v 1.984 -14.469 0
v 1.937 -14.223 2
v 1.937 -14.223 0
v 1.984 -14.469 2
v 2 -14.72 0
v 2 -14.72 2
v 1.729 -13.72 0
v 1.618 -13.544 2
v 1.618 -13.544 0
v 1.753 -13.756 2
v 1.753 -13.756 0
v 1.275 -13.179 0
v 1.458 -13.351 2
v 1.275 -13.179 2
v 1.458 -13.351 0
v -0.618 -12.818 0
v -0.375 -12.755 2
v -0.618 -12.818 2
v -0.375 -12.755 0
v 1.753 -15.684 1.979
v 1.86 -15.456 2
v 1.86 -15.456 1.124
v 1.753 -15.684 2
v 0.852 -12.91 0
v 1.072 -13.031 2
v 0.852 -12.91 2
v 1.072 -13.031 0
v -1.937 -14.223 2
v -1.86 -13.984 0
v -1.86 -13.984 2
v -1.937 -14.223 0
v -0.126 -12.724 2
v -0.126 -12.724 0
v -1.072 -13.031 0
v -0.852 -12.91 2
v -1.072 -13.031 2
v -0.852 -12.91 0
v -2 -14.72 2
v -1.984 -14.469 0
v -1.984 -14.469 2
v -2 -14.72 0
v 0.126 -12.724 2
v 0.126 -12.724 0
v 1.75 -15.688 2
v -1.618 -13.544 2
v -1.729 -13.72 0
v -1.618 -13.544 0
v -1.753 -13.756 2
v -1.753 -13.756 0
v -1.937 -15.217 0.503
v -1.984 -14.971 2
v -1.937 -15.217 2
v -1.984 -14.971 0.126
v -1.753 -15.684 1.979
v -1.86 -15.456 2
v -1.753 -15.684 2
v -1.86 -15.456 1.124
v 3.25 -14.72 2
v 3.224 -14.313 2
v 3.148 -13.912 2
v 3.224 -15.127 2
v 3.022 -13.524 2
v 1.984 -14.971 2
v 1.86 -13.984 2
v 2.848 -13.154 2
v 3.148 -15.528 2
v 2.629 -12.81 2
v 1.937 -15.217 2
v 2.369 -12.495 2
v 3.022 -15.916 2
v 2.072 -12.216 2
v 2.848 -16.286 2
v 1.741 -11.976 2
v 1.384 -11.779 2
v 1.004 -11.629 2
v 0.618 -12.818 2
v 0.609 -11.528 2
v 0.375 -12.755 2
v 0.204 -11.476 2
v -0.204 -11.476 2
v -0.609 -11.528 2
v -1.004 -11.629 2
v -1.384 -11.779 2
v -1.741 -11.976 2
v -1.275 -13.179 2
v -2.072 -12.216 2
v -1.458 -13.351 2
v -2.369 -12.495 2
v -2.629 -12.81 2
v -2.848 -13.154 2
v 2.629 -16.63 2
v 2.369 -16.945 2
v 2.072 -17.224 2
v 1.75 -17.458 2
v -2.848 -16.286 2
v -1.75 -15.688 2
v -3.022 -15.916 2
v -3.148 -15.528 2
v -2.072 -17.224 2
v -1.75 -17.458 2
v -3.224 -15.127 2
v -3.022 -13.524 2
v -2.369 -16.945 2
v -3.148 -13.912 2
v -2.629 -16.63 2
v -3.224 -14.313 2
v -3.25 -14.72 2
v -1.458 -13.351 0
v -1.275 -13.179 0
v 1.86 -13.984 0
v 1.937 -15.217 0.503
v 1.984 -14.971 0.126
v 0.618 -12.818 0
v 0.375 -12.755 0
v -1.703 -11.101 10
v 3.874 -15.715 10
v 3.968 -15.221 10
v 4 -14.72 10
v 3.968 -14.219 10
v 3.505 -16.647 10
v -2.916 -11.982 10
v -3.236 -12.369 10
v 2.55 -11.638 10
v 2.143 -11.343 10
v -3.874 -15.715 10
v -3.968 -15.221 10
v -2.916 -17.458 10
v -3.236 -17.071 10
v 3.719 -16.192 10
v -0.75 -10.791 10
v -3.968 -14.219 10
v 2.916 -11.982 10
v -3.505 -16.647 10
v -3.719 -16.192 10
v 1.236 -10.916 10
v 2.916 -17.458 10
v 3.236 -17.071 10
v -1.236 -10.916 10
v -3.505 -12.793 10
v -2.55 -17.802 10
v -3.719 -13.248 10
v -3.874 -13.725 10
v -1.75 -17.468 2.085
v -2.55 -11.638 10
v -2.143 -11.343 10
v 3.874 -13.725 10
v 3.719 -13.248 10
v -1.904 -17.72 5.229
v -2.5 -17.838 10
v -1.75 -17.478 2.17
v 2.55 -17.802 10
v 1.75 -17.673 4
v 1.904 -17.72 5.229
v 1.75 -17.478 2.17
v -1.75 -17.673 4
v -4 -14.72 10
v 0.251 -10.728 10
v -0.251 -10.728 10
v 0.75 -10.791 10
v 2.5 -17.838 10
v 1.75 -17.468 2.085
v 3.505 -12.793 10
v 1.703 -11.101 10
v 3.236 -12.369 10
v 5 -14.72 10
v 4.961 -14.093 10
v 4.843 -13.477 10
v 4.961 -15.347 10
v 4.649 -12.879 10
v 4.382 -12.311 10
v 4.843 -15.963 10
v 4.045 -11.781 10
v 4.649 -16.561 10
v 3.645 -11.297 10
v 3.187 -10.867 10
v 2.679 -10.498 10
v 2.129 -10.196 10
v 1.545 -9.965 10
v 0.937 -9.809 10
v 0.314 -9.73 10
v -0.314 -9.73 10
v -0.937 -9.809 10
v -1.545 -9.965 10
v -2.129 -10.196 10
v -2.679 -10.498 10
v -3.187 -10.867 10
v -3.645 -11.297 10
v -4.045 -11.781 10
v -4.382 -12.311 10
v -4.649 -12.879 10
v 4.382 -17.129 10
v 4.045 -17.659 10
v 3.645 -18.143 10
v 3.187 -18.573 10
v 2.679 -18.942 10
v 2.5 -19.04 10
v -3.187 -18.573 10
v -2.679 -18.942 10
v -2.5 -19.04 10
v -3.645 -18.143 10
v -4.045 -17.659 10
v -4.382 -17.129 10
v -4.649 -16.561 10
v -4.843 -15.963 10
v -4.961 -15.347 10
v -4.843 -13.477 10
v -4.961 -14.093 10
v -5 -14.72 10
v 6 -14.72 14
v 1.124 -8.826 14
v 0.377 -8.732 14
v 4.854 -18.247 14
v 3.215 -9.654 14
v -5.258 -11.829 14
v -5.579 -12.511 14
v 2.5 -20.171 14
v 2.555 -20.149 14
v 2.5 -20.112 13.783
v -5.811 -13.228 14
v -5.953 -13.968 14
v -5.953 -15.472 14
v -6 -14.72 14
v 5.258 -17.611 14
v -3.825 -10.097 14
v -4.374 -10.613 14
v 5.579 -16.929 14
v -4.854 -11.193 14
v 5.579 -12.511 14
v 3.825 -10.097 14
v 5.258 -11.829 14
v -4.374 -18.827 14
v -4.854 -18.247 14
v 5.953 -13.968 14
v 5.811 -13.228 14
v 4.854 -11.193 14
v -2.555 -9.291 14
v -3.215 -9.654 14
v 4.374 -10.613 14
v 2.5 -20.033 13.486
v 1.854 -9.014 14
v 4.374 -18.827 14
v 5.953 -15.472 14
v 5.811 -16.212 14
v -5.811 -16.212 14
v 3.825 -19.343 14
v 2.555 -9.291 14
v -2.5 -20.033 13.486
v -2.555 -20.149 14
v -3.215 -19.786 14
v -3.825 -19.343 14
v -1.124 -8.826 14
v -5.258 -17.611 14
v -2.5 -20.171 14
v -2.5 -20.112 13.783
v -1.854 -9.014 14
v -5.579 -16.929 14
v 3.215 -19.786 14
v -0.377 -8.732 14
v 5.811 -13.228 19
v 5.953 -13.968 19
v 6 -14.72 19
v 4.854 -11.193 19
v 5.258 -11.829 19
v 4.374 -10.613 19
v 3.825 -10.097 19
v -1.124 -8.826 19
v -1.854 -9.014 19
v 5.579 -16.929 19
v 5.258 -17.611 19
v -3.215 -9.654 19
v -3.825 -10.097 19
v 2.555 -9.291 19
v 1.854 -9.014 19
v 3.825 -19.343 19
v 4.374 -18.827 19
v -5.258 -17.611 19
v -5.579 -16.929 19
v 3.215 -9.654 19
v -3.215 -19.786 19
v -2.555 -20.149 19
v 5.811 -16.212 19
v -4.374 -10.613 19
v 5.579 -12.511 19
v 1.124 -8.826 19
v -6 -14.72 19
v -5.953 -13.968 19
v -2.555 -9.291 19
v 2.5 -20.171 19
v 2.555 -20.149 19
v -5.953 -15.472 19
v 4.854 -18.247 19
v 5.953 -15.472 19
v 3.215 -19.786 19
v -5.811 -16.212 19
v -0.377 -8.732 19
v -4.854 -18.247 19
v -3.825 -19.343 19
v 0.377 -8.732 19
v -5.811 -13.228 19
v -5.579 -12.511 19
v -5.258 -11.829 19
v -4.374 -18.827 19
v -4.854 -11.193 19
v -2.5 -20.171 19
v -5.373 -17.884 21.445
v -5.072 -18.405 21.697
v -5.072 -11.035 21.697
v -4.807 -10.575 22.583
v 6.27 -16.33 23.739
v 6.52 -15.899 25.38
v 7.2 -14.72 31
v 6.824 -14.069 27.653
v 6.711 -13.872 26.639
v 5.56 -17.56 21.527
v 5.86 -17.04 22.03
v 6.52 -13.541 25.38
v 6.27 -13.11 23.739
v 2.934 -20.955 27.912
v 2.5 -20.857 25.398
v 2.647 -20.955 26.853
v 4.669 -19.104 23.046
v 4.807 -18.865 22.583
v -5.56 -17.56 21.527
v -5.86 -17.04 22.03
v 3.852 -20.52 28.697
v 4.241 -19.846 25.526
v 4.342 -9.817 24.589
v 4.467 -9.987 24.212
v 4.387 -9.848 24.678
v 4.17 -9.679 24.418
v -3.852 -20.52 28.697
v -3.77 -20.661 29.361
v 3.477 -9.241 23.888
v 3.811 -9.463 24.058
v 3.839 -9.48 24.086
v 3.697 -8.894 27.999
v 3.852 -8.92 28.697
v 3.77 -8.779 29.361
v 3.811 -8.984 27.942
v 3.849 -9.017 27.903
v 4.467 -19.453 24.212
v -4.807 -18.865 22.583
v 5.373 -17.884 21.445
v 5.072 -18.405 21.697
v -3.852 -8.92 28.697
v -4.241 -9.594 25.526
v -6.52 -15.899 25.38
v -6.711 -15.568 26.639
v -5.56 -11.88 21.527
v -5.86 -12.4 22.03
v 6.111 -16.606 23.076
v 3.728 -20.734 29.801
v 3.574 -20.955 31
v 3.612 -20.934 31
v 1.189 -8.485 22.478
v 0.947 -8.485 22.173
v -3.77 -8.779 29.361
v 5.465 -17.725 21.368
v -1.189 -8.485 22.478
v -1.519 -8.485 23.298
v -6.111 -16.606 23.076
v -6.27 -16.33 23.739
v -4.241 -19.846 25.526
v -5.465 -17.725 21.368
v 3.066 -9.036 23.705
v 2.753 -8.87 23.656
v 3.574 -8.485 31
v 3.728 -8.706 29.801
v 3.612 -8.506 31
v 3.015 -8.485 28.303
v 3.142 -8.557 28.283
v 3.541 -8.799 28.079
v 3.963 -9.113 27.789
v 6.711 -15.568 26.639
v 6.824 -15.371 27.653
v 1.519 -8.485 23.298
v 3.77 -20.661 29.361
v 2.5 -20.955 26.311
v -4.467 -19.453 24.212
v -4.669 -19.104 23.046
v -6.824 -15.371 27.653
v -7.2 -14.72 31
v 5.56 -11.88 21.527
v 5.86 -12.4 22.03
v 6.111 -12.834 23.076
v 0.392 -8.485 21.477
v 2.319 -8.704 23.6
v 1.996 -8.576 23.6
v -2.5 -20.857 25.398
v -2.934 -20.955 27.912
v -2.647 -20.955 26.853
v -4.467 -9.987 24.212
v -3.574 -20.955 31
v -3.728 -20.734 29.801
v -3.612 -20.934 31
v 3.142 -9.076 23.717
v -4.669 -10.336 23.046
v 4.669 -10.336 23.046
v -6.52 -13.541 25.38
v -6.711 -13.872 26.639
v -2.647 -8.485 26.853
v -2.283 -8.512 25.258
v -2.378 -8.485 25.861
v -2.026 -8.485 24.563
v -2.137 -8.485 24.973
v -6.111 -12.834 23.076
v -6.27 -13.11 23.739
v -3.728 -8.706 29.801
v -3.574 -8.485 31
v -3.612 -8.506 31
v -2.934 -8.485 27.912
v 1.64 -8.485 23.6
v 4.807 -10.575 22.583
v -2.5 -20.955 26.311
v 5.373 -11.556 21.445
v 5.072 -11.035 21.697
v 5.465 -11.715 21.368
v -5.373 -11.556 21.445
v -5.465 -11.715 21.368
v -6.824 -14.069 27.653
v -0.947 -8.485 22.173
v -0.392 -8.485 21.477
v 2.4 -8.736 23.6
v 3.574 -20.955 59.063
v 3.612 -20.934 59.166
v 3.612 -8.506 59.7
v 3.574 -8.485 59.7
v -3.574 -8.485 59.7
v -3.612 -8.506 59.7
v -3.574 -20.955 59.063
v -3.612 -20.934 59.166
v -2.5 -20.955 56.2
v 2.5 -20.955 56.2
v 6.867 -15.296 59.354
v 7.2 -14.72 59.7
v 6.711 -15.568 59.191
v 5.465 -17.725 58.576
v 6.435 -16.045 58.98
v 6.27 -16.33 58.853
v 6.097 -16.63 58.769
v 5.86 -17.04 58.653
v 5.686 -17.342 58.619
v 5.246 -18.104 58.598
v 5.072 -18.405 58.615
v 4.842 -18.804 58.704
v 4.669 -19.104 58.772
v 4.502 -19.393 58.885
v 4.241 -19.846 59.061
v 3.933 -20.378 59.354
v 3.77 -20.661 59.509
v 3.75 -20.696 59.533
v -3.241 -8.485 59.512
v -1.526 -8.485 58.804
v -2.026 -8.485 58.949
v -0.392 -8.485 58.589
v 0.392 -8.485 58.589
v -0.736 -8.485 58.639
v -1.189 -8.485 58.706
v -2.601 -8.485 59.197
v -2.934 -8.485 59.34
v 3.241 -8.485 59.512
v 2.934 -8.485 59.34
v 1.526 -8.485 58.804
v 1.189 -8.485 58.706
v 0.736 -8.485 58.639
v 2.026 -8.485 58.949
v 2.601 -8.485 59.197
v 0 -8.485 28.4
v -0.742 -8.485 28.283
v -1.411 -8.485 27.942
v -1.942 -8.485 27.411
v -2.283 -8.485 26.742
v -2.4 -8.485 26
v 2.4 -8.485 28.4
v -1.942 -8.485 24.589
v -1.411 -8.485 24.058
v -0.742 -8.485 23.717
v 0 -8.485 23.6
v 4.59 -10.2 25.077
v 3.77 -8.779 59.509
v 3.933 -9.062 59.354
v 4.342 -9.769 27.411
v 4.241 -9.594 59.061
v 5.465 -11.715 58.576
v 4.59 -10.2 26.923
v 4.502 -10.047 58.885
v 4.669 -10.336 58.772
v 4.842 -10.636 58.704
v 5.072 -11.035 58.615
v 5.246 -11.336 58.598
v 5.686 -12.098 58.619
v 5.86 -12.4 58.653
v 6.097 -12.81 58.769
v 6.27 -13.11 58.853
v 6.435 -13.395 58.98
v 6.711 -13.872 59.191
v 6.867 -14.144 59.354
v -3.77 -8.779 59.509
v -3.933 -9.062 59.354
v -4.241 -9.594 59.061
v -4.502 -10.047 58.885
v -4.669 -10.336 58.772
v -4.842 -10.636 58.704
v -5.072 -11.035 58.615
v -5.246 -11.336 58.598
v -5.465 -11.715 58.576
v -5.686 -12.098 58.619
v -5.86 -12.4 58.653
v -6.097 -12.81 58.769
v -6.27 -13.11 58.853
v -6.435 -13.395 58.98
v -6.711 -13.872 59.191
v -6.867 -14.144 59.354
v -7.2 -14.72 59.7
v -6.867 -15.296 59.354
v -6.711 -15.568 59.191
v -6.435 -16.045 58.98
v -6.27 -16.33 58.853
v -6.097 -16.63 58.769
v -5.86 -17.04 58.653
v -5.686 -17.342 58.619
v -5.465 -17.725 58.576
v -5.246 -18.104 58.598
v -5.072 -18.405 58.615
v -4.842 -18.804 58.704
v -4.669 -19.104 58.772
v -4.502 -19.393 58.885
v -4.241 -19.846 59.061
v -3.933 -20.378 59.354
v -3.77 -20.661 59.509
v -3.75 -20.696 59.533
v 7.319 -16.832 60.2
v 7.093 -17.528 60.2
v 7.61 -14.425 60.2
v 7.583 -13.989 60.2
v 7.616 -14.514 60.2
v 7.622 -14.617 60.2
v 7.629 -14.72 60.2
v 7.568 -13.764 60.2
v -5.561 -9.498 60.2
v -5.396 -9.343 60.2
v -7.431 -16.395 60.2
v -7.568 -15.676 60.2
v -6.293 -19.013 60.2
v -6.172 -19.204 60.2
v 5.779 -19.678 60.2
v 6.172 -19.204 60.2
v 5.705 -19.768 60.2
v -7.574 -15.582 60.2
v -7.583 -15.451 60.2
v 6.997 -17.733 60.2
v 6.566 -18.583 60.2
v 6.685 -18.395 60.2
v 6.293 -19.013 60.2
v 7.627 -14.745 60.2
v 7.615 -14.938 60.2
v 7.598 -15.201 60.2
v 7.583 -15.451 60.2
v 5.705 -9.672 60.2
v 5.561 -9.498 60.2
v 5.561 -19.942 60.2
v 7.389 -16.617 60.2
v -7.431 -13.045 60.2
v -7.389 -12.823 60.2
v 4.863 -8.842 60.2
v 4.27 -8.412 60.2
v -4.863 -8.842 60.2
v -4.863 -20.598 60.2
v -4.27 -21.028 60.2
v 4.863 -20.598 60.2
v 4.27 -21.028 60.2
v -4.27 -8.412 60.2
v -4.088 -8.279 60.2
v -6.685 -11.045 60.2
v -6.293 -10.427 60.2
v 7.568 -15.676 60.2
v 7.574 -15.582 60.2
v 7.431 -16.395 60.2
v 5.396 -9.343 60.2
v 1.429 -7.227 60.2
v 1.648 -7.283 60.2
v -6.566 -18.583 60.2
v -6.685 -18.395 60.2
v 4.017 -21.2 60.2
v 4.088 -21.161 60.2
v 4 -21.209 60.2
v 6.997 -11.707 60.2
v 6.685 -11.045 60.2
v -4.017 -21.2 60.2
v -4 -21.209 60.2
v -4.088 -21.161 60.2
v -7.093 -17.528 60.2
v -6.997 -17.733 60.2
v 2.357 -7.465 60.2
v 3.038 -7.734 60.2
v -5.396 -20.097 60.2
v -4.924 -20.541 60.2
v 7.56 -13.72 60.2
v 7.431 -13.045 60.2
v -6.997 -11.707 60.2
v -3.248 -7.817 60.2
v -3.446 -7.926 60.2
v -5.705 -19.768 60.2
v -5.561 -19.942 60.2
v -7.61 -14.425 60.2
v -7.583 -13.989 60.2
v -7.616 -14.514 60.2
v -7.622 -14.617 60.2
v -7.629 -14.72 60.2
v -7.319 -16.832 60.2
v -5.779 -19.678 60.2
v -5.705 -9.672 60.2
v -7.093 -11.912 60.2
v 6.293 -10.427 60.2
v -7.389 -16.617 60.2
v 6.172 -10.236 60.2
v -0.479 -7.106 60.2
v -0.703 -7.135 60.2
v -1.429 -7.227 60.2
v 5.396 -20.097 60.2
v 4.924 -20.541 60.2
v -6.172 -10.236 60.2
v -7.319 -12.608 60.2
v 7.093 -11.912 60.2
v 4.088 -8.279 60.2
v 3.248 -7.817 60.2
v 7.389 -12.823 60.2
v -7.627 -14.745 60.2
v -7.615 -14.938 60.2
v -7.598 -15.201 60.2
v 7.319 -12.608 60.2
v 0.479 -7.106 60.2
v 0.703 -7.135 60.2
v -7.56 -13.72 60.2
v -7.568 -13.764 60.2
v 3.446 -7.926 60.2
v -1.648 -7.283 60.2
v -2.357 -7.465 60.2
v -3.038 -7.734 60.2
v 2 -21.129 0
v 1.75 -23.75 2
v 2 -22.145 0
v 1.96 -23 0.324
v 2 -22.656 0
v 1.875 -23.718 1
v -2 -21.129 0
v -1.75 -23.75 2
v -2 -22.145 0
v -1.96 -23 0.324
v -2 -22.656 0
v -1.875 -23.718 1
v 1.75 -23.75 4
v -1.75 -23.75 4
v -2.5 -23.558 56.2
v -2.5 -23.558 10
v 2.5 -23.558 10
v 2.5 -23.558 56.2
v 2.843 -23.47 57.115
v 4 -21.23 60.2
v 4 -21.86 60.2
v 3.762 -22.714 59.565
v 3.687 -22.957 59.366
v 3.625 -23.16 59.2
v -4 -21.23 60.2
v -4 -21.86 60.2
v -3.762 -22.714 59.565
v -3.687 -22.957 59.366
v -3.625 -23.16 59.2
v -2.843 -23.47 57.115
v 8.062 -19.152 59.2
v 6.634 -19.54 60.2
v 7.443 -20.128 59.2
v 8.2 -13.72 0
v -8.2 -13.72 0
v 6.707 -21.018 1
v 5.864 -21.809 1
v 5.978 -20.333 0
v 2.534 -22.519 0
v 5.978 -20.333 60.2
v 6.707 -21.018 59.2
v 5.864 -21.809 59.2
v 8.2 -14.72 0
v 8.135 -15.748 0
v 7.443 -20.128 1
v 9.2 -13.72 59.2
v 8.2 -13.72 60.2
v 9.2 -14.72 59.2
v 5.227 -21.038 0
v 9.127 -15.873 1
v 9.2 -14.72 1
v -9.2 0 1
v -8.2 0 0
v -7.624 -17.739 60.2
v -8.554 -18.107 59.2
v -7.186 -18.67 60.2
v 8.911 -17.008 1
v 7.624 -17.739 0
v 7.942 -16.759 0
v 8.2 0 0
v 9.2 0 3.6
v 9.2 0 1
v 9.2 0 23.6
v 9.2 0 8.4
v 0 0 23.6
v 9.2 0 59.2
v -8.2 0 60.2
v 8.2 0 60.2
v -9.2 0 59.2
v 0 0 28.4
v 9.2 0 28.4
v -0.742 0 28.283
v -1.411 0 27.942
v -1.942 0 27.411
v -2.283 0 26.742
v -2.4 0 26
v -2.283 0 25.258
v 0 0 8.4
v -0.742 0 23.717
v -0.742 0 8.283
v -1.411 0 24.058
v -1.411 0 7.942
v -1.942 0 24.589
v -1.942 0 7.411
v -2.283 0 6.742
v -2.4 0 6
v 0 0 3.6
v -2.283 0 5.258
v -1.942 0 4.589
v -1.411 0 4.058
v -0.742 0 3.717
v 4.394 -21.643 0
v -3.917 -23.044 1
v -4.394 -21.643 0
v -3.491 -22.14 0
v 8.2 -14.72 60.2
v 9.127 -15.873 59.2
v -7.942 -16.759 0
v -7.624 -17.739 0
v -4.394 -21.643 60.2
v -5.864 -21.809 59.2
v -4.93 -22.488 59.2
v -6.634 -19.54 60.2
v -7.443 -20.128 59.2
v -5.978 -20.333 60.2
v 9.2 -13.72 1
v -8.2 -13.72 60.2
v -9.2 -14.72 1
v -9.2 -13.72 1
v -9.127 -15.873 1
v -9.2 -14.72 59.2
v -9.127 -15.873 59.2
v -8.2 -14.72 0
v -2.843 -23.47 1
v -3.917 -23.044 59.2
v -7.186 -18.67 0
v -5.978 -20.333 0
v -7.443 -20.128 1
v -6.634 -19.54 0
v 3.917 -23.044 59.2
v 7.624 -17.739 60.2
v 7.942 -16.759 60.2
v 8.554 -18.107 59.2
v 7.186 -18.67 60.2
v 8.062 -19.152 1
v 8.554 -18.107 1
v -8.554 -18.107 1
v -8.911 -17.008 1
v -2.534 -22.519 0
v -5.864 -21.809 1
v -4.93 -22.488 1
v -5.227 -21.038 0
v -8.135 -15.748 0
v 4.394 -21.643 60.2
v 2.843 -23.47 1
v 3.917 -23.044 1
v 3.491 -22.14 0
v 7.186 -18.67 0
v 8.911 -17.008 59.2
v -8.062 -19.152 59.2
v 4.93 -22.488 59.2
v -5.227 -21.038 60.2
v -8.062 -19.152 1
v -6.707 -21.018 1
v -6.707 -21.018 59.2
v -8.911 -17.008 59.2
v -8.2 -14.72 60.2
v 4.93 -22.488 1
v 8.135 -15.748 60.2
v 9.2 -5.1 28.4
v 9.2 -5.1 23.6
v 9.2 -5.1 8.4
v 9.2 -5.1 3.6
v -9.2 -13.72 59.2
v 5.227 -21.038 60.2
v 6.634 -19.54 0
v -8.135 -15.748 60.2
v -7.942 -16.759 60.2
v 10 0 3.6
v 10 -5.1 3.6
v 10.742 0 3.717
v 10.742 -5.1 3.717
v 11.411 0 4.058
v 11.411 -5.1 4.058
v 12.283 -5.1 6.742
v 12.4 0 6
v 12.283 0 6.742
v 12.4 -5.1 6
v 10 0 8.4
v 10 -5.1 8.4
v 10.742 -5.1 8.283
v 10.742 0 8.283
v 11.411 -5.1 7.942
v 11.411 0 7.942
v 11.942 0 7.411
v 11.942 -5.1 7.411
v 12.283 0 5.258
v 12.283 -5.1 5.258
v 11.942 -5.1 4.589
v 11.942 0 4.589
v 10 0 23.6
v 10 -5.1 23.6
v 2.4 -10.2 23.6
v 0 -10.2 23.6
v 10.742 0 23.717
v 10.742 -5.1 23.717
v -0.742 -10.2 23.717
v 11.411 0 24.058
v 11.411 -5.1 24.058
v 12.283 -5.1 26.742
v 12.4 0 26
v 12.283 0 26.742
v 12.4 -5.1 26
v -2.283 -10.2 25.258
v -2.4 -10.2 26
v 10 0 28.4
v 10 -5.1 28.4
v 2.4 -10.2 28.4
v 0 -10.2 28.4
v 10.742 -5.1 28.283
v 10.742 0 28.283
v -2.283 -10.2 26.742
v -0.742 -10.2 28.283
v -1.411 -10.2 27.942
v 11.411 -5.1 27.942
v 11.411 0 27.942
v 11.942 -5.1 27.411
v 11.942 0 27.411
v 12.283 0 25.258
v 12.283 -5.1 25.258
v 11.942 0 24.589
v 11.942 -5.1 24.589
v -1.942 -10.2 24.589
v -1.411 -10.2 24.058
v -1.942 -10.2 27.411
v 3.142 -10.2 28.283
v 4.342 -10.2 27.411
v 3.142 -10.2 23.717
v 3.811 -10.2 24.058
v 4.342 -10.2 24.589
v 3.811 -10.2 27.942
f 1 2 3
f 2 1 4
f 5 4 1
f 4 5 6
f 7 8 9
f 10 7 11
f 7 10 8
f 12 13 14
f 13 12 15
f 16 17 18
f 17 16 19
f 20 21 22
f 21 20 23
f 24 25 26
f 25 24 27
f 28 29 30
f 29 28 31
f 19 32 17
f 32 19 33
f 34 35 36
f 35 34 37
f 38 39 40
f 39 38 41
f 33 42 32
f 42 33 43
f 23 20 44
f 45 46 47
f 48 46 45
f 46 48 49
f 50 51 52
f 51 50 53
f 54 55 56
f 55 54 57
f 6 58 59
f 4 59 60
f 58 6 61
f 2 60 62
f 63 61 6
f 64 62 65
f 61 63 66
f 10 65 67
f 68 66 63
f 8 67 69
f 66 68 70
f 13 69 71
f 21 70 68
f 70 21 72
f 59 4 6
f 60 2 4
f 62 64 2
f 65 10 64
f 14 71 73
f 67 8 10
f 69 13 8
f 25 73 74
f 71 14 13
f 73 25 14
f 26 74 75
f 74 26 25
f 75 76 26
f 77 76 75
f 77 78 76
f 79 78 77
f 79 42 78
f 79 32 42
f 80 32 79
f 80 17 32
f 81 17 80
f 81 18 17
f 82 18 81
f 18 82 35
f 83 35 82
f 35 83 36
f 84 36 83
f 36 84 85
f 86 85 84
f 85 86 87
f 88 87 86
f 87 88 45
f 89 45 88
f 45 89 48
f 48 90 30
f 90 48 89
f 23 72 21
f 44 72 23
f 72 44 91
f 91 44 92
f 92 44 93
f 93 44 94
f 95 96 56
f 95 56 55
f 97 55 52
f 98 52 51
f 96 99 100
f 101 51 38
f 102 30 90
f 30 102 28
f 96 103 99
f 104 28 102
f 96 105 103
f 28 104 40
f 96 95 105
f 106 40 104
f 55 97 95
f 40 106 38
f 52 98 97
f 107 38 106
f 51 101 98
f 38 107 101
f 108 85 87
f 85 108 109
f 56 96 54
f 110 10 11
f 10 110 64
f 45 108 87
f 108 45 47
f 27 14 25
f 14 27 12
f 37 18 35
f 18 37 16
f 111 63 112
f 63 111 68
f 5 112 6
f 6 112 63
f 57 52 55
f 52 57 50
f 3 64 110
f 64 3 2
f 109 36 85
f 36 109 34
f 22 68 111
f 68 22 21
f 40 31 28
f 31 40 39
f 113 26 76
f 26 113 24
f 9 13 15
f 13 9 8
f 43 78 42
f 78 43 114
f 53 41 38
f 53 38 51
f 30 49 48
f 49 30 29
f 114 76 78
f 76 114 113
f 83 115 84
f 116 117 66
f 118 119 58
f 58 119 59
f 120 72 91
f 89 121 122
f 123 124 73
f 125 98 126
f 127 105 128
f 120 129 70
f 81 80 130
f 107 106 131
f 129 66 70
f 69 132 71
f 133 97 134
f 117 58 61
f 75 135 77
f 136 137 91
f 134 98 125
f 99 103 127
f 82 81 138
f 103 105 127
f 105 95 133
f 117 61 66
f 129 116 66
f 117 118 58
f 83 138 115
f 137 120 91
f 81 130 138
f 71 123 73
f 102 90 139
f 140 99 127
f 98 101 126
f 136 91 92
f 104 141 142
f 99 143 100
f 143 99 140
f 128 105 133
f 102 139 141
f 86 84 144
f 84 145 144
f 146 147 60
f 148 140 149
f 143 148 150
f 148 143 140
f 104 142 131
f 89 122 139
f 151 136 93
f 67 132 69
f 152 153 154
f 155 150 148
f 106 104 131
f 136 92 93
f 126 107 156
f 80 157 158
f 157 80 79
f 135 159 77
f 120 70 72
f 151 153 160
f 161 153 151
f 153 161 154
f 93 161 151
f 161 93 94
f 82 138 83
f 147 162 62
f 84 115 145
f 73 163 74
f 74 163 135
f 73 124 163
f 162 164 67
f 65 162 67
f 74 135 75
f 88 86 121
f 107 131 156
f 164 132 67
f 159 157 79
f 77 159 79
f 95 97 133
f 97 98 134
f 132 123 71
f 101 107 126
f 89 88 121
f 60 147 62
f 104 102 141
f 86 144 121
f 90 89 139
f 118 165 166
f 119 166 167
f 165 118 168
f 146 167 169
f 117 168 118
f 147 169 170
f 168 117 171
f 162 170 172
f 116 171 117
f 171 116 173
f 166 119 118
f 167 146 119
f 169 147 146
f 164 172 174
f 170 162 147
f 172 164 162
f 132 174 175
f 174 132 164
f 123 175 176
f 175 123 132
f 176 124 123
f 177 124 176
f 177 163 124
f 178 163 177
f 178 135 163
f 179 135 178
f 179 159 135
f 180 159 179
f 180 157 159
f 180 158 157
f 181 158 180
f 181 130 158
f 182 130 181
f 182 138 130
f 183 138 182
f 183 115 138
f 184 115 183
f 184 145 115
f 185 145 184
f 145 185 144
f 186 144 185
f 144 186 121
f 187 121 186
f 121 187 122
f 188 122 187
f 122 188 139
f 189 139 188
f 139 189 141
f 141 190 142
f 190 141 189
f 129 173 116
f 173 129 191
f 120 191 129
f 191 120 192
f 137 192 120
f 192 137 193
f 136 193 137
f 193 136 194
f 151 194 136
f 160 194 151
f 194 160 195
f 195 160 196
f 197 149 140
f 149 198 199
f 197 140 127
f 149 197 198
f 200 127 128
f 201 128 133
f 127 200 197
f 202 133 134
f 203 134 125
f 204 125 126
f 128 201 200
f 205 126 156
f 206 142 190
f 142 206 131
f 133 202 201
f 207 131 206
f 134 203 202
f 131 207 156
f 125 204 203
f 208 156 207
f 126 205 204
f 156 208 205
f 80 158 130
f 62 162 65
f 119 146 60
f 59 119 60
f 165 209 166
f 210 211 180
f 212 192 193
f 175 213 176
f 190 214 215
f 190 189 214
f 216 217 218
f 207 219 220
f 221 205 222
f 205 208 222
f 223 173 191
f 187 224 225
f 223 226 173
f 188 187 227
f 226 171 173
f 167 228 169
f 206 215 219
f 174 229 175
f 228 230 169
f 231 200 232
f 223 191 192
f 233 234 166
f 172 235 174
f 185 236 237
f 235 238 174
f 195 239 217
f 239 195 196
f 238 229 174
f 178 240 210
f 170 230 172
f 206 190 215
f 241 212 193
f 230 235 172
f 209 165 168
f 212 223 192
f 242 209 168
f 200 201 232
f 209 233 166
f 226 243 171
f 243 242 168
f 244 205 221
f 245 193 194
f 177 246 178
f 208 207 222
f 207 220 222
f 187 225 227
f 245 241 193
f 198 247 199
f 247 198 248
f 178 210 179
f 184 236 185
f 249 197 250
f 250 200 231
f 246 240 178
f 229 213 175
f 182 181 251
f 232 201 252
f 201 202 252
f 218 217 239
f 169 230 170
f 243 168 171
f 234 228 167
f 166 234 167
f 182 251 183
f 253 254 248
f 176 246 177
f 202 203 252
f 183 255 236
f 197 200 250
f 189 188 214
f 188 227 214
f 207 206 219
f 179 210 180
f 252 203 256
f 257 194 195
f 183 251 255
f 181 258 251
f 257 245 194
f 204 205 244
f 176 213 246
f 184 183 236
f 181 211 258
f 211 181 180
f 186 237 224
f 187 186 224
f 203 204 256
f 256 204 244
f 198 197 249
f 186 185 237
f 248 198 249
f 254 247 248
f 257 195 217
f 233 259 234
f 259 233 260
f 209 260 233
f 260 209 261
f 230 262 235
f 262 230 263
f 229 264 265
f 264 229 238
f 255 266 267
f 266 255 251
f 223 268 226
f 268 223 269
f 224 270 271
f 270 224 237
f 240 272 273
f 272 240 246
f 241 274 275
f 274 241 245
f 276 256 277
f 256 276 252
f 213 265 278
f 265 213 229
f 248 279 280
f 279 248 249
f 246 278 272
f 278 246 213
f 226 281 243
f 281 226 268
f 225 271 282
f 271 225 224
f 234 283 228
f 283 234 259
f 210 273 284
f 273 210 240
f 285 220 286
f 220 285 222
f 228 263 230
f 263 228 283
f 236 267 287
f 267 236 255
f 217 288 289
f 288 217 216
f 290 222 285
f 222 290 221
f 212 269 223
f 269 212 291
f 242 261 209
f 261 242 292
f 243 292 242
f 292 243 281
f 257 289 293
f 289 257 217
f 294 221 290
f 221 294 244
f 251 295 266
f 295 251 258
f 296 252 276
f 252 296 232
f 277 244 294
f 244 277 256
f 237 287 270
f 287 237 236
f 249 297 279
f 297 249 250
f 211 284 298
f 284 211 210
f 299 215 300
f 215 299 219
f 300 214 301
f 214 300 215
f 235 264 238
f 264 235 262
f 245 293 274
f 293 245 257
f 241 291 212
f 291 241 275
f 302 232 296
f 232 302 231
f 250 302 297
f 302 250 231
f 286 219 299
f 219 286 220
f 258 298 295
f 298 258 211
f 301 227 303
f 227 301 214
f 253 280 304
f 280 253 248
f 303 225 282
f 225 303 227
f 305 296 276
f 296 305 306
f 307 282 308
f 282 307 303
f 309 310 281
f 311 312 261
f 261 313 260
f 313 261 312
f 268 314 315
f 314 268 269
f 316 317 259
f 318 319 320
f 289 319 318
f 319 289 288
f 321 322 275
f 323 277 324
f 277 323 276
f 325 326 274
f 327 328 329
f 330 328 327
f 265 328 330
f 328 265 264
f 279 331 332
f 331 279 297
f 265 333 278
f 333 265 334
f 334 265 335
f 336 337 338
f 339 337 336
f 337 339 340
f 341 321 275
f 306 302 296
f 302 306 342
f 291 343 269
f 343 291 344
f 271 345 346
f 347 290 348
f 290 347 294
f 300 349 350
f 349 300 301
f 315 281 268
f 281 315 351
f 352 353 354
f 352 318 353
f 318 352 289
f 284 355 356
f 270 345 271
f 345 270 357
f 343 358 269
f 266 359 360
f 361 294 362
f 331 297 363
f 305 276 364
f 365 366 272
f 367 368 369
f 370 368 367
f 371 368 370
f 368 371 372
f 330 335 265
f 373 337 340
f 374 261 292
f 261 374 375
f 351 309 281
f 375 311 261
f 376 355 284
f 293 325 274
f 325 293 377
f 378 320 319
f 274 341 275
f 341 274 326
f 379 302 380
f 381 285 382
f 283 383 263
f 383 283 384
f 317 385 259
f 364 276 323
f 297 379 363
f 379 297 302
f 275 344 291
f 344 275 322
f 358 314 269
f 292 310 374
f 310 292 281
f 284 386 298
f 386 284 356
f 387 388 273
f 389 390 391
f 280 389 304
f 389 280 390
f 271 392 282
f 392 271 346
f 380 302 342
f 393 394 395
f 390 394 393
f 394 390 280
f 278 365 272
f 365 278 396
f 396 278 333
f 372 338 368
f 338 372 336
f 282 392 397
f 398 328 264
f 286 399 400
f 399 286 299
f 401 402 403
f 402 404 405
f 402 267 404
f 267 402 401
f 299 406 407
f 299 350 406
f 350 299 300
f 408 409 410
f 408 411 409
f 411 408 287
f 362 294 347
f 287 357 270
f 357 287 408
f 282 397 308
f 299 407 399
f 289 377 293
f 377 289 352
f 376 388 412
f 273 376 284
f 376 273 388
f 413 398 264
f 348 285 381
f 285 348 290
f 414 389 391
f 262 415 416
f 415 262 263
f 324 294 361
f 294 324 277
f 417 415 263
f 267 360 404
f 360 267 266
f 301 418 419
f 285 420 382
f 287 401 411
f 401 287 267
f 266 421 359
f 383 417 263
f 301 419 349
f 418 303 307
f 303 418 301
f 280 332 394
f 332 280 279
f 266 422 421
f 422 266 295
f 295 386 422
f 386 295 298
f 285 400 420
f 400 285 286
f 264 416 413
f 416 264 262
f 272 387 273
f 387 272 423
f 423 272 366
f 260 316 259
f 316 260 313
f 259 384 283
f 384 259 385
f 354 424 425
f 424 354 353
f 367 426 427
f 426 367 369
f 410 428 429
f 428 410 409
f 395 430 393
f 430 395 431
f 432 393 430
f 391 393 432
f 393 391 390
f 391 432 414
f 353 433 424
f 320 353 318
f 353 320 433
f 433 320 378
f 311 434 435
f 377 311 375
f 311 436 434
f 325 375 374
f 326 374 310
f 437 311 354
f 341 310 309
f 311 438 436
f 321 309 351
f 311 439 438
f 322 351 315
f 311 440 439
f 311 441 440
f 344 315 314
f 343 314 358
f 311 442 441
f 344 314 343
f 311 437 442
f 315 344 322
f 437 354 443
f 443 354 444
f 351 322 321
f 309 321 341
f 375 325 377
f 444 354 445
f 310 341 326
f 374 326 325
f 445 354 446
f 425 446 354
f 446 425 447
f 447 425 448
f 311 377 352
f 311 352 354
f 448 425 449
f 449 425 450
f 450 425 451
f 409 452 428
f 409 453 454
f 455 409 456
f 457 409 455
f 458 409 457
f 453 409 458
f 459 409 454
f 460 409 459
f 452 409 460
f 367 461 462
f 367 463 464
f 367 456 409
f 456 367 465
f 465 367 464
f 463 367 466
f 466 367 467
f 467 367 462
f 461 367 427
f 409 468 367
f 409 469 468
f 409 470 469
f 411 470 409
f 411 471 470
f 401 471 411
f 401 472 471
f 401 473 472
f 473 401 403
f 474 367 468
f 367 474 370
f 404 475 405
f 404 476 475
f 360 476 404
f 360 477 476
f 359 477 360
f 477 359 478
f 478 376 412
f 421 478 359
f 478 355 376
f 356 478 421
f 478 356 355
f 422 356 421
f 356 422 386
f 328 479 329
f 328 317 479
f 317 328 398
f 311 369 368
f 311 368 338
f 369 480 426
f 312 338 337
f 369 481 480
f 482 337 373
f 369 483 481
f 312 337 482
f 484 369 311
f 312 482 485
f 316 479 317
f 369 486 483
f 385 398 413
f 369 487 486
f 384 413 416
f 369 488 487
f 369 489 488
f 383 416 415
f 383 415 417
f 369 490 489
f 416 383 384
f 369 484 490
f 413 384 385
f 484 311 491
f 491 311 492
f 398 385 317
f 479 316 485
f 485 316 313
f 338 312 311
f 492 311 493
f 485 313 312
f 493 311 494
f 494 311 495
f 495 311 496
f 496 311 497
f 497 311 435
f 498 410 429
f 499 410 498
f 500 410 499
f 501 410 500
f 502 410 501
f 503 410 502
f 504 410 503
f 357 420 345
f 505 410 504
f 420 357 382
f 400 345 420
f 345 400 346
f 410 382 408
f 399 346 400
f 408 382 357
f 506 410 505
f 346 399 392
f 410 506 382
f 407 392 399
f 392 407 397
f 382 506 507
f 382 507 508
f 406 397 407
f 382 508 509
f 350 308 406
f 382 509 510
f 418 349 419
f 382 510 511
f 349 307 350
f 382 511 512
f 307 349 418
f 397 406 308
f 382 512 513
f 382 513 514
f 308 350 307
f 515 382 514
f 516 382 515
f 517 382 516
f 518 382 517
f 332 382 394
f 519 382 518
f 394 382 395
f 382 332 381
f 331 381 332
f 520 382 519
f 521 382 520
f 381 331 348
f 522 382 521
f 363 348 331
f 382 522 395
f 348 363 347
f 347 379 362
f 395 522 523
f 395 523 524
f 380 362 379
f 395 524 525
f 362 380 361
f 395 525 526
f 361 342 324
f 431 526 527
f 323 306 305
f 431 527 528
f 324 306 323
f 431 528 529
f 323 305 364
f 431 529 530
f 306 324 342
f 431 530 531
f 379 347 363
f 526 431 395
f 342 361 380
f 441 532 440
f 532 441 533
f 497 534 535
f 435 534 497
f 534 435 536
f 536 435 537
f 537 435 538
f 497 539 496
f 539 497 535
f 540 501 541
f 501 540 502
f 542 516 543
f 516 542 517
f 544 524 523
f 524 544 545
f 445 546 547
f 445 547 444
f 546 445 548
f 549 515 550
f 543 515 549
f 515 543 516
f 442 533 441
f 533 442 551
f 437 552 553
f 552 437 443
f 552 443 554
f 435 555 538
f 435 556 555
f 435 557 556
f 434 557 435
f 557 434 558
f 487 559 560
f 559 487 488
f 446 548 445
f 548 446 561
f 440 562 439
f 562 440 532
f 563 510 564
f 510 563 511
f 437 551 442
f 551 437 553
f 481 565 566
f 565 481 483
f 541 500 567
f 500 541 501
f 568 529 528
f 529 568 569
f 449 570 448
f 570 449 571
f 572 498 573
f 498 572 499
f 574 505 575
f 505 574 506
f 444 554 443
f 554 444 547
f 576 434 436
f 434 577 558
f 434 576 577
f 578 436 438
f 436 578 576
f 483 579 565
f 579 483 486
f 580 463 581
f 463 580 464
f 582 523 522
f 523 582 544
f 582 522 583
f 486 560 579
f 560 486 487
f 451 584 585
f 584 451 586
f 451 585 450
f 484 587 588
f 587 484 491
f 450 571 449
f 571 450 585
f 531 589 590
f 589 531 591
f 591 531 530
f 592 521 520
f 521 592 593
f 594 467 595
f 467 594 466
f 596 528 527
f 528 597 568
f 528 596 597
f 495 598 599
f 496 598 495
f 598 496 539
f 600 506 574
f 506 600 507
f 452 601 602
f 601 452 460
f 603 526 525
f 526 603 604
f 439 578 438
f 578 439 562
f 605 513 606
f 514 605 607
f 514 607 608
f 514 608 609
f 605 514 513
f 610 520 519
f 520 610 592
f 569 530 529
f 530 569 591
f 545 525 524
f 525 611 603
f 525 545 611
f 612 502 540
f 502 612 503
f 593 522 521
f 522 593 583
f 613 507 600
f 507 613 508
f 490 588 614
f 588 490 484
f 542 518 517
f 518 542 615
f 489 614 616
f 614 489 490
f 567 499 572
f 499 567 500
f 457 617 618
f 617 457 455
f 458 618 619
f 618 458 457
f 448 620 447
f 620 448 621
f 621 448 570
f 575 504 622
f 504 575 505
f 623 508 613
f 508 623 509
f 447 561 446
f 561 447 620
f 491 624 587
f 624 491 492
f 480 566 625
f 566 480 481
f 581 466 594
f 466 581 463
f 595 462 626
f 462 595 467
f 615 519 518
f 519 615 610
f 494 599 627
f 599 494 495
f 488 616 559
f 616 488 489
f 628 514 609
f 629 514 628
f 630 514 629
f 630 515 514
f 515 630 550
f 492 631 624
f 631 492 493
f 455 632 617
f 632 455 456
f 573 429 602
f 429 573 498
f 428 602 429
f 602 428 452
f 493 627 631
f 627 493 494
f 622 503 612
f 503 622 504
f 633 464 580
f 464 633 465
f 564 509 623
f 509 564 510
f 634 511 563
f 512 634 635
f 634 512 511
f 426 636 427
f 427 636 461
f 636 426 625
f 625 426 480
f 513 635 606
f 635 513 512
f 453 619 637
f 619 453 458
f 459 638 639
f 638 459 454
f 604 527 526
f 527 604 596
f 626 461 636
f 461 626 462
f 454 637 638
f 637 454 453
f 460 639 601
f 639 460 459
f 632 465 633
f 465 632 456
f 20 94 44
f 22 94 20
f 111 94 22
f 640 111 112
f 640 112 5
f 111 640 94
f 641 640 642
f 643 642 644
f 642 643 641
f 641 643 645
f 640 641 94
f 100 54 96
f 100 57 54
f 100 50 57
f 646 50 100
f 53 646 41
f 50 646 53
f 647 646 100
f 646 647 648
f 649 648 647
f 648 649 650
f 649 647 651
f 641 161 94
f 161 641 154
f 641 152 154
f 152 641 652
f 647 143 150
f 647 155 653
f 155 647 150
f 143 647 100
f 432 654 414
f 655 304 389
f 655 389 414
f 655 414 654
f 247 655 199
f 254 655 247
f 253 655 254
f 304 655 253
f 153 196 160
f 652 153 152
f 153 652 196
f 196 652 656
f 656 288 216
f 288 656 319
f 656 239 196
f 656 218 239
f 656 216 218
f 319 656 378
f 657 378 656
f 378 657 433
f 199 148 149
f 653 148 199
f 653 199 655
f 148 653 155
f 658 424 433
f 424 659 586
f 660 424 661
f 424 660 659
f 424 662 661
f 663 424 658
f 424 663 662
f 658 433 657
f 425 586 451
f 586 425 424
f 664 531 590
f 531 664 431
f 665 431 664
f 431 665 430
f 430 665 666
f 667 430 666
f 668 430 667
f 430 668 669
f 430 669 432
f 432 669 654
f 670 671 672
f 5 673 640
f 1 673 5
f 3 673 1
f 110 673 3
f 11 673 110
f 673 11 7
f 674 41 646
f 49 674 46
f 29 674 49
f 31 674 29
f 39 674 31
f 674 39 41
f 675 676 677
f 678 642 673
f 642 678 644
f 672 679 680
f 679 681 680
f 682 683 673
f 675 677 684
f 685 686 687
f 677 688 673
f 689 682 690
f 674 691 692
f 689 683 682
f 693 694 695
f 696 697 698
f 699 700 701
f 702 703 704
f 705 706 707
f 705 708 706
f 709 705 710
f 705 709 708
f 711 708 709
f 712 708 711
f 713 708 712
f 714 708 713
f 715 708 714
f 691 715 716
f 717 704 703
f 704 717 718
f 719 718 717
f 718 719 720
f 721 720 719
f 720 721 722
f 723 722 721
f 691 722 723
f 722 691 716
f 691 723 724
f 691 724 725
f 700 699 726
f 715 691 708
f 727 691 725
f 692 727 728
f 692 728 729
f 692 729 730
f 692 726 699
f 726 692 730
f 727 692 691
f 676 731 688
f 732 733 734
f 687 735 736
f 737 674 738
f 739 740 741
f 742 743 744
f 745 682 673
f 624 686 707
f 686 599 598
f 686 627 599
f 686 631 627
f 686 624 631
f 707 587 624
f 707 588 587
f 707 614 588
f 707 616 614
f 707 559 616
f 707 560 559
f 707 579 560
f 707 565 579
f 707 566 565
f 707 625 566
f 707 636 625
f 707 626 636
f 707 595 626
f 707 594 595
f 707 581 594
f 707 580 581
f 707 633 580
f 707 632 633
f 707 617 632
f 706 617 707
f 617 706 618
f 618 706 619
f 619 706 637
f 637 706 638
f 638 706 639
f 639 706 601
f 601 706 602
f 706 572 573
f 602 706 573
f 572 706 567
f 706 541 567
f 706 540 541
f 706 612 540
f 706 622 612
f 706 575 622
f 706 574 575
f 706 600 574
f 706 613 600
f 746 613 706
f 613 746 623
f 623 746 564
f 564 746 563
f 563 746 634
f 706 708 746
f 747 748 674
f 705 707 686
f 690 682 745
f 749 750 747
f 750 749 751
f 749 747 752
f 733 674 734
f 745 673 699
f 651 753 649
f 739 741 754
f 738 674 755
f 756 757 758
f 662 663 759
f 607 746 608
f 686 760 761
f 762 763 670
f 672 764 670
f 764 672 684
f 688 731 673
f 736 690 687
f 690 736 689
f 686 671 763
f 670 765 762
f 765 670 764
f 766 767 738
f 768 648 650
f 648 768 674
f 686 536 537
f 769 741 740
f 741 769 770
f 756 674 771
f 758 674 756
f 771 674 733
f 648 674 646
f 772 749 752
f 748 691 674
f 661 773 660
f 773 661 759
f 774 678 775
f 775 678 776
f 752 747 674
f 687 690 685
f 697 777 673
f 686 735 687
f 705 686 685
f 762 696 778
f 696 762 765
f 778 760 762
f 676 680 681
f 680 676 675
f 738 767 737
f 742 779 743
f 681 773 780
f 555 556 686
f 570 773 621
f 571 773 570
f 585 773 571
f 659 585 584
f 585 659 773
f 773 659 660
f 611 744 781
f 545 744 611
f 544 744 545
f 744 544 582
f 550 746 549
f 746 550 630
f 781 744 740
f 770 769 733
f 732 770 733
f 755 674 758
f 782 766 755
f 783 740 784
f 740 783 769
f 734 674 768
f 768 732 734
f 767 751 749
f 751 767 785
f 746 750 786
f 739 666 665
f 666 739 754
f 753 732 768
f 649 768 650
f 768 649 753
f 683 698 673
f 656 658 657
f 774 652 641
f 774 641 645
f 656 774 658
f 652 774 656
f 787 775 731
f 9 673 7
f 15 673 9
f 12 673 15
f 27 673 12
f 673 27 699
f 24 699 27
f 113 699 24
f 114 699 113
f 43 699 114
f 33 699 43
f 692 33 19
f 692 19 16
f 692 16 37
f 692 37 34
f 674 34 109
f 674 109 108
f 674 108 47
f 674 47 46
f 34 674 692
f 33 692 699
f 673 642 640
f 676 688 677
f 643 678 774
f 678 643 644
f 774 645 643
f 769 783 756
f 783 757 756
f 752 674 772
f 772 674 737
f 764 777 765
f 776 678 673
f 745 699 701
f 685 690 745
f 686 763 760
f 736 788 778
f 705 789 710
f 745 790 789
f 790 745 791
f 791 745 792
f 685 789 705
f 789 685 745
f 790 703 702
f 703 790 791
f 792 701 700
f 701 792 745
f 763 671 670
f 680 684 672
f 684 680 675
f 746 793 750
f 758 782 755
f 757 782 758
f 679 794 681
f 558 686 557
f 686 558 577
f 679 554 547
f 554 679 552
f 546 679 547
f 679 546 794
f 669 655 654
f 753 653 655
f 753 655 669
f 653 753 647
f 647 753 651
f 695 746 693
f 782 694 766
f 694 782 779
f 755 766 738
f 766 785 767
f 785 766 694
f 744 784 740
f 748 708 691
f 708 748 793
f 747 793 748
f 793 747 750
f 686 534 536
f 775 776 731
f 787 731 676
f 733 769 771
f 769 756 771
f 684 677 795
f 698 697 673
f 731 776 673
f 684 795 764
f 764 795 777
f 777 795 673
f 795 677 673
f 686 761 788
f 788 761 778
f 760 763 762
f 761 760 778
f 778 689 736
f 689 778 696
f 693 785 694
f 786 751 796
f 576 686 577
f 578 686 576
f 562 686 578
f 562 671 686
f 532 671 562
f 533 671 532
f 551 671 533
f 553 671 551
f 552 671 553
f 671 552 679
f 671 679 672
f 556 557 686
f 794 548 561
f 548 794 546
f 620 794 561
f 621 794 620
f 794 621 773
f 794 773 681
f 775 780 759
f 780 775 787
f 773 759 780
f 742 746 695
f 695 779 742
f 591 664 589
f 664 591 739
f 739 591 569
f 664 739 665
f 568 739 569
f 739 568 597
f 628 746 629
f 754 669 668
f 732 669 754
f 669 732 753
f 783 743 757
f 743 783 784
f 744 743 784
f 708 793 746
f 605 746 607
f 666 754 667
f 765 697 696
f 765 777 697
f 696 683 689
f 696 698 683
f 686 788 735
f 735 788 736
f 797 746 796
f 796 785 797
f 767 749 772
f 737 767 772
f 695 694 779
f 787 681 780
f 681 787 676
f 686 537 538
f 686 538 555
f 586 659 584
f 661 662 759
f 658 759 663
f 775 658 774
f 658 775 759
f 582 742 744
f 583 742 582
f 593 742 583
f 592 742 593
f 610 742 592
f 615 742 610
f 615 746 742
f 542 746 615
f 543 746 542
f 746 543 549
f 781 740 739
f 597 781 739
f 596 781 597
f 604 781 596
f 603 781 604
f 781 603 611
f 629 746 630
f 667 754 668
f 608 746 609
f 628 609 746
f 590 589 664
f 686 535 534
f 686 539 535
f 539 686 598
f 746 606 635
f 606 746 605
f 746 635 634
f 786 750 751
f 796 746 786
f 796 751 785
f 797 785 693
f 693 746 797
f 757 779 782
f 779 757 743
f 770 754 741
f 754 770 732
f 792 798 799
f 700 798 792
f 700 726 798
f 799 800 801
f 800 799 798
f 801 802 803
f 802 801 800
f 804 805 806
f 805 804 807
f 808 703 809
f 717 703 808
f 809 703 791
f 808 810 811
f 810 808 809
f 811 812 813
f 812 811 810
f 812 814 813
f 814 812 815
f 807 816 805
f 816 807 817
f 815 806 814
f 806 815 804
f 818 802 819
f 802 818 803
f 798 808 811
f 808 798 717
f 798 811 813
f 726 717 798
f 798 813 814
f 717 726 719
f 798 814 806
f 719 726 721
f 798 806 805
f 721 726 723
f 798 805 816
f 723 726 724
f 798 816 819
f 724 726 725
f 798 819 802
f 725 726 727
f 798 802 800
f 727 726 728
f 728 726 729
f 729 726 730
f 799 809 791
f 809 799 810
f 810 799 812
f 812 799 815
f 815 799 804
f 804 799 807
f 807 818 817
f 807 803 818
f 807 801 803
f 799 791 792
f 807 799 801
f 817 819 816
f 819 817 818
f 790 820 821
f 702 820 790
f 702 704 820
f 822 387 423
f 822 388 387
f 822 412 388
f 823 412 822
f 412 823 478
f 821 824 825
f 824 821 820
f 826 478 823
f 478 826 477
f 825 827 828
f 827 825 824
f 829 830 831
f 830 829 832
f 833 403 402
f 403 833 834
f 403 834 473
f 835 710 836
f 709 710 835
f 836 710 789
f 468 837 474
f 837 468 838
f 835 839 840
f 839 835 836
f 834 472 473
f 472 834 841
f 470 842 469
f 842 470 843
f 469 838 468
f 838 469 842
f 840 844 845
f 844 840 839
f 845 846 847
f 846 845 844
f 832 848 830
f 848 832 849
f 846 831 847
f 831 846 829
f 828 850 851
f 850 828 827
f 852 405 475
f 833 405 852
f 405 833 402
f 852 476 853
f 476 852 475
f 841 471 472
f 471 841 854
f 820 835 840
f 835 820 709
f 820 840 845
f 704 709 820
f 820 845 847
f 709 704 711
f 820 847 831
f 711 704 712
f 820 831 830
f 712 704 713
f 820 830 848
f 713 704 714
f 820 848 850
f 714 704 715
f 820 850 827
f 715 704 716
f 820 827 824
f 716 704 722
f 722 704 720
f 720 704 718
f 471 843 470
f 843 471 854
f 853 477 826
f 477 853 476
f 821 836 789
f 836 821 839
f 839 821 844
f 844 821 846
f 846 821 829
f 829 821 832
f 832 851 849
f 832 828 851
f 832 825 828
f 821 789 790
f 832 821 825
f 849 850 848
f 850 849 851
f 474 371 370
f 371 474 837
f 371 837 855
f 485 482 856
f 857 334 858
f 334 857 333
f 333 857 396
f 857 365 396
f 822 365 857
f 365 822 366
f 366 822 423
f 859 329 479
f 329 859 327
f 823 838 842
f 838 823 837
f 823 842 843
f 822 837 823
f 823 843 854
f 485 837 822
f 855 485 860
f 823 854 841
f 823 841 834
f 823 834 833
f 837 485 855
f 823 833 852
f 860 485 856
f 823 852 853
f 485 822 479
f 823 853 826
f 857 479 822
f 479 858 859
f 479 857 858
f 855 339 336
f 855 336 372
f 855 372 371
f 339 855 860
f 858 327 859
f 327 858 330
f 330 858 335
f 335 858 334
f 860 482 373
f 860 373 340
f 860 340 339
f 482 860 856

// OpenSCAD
include <BOSL/constants.scad>
use <BOSL/shapes.scad>
use <BOSL/transforms.scad>
include <jb-scad/skadis.scad>

r_inner=7.2;
r_outer=r_inner+2;
h_inner1=58.2;
h_inner2=h_inner1-21;
h_outer=h_inner1+2;

$fn=50;

module mass() {
    hull() {
        cuboid(
            [2*r_outer,1.6*r_outer,h_outer], 
            chamfer=1, edges=EDGES_ALL-EDGES_BACK, 
            align=V_TOP+V_BACK
        );
        cyl(h=h_outer, r=r_outer, chamfer=1, align=V_TOP);
    }
}

module yato() {
    union() {
        intersection() {
            union() {
                zmove(-1) cylinder(h=3, d=4);
                zmove(2) cylinder(h=8, d2=8, d1=6.5);
                zmove(10) cylinder(h=4, d1=10, d2=12);
                zmove(14) cylinder(d=12, h=5);
                zmove(19) cylinder(d1=12, r2=r_inner, h=12);
                zmove(31) cylinder(r=r_inner, h=h_inner2);
            }
            zmove(-2) cylinder(h=h_inner1+4, r=r_inner, $fn=6);    
        }
        zmove(h_inner1-2) cylinder(h=7, r1=r_inner-3, r2=r_inner+3);
    }
}

module front_hole() {
    hull() {
        zmove(-1) cuboid([4, 1.2*r_outer, 1], align=V_FRONT+V_TOP);
        zmove(-1) cuboid([3.5, 1.2*r_outer, 3], align=V_FRONT+V_TOP);
    }
    zmove(-1) cuboid([3.5, 1.2*r_outer, 5], align=V_FRONT+V_TOP);
    hull() {
        zmove(4) cuboid([3.5, 1.2*r_outer, 3], align=V_FRONT+V_TOP);
        zmove(10) cuboid([5, 1.2*r_outer, h_outer-9], align=V_FRONT+V_TOP);
    }
    hull() {
        zmove(h_outer-4) cuboid([5, 1.2*r_outer, 1], align=V_FRONT+V_TOP);
        zmove(h_outer) cuboid([8, 1.2*r_outer, 1], align=V_FRONT+V_TOP);
    }
}

module yatoSkadis() {
    zmove(1.6*r_outer) xrot(-90) difference() {
        mass();
        yato();
        front_hole();
    }
    ymove(6) union() {
        skadis_hook_single();
        ymove(SKADIS_HOLES_SPACING_X) skadis_hook_single();
    }
}

xrot(90) yatoSkadis();
